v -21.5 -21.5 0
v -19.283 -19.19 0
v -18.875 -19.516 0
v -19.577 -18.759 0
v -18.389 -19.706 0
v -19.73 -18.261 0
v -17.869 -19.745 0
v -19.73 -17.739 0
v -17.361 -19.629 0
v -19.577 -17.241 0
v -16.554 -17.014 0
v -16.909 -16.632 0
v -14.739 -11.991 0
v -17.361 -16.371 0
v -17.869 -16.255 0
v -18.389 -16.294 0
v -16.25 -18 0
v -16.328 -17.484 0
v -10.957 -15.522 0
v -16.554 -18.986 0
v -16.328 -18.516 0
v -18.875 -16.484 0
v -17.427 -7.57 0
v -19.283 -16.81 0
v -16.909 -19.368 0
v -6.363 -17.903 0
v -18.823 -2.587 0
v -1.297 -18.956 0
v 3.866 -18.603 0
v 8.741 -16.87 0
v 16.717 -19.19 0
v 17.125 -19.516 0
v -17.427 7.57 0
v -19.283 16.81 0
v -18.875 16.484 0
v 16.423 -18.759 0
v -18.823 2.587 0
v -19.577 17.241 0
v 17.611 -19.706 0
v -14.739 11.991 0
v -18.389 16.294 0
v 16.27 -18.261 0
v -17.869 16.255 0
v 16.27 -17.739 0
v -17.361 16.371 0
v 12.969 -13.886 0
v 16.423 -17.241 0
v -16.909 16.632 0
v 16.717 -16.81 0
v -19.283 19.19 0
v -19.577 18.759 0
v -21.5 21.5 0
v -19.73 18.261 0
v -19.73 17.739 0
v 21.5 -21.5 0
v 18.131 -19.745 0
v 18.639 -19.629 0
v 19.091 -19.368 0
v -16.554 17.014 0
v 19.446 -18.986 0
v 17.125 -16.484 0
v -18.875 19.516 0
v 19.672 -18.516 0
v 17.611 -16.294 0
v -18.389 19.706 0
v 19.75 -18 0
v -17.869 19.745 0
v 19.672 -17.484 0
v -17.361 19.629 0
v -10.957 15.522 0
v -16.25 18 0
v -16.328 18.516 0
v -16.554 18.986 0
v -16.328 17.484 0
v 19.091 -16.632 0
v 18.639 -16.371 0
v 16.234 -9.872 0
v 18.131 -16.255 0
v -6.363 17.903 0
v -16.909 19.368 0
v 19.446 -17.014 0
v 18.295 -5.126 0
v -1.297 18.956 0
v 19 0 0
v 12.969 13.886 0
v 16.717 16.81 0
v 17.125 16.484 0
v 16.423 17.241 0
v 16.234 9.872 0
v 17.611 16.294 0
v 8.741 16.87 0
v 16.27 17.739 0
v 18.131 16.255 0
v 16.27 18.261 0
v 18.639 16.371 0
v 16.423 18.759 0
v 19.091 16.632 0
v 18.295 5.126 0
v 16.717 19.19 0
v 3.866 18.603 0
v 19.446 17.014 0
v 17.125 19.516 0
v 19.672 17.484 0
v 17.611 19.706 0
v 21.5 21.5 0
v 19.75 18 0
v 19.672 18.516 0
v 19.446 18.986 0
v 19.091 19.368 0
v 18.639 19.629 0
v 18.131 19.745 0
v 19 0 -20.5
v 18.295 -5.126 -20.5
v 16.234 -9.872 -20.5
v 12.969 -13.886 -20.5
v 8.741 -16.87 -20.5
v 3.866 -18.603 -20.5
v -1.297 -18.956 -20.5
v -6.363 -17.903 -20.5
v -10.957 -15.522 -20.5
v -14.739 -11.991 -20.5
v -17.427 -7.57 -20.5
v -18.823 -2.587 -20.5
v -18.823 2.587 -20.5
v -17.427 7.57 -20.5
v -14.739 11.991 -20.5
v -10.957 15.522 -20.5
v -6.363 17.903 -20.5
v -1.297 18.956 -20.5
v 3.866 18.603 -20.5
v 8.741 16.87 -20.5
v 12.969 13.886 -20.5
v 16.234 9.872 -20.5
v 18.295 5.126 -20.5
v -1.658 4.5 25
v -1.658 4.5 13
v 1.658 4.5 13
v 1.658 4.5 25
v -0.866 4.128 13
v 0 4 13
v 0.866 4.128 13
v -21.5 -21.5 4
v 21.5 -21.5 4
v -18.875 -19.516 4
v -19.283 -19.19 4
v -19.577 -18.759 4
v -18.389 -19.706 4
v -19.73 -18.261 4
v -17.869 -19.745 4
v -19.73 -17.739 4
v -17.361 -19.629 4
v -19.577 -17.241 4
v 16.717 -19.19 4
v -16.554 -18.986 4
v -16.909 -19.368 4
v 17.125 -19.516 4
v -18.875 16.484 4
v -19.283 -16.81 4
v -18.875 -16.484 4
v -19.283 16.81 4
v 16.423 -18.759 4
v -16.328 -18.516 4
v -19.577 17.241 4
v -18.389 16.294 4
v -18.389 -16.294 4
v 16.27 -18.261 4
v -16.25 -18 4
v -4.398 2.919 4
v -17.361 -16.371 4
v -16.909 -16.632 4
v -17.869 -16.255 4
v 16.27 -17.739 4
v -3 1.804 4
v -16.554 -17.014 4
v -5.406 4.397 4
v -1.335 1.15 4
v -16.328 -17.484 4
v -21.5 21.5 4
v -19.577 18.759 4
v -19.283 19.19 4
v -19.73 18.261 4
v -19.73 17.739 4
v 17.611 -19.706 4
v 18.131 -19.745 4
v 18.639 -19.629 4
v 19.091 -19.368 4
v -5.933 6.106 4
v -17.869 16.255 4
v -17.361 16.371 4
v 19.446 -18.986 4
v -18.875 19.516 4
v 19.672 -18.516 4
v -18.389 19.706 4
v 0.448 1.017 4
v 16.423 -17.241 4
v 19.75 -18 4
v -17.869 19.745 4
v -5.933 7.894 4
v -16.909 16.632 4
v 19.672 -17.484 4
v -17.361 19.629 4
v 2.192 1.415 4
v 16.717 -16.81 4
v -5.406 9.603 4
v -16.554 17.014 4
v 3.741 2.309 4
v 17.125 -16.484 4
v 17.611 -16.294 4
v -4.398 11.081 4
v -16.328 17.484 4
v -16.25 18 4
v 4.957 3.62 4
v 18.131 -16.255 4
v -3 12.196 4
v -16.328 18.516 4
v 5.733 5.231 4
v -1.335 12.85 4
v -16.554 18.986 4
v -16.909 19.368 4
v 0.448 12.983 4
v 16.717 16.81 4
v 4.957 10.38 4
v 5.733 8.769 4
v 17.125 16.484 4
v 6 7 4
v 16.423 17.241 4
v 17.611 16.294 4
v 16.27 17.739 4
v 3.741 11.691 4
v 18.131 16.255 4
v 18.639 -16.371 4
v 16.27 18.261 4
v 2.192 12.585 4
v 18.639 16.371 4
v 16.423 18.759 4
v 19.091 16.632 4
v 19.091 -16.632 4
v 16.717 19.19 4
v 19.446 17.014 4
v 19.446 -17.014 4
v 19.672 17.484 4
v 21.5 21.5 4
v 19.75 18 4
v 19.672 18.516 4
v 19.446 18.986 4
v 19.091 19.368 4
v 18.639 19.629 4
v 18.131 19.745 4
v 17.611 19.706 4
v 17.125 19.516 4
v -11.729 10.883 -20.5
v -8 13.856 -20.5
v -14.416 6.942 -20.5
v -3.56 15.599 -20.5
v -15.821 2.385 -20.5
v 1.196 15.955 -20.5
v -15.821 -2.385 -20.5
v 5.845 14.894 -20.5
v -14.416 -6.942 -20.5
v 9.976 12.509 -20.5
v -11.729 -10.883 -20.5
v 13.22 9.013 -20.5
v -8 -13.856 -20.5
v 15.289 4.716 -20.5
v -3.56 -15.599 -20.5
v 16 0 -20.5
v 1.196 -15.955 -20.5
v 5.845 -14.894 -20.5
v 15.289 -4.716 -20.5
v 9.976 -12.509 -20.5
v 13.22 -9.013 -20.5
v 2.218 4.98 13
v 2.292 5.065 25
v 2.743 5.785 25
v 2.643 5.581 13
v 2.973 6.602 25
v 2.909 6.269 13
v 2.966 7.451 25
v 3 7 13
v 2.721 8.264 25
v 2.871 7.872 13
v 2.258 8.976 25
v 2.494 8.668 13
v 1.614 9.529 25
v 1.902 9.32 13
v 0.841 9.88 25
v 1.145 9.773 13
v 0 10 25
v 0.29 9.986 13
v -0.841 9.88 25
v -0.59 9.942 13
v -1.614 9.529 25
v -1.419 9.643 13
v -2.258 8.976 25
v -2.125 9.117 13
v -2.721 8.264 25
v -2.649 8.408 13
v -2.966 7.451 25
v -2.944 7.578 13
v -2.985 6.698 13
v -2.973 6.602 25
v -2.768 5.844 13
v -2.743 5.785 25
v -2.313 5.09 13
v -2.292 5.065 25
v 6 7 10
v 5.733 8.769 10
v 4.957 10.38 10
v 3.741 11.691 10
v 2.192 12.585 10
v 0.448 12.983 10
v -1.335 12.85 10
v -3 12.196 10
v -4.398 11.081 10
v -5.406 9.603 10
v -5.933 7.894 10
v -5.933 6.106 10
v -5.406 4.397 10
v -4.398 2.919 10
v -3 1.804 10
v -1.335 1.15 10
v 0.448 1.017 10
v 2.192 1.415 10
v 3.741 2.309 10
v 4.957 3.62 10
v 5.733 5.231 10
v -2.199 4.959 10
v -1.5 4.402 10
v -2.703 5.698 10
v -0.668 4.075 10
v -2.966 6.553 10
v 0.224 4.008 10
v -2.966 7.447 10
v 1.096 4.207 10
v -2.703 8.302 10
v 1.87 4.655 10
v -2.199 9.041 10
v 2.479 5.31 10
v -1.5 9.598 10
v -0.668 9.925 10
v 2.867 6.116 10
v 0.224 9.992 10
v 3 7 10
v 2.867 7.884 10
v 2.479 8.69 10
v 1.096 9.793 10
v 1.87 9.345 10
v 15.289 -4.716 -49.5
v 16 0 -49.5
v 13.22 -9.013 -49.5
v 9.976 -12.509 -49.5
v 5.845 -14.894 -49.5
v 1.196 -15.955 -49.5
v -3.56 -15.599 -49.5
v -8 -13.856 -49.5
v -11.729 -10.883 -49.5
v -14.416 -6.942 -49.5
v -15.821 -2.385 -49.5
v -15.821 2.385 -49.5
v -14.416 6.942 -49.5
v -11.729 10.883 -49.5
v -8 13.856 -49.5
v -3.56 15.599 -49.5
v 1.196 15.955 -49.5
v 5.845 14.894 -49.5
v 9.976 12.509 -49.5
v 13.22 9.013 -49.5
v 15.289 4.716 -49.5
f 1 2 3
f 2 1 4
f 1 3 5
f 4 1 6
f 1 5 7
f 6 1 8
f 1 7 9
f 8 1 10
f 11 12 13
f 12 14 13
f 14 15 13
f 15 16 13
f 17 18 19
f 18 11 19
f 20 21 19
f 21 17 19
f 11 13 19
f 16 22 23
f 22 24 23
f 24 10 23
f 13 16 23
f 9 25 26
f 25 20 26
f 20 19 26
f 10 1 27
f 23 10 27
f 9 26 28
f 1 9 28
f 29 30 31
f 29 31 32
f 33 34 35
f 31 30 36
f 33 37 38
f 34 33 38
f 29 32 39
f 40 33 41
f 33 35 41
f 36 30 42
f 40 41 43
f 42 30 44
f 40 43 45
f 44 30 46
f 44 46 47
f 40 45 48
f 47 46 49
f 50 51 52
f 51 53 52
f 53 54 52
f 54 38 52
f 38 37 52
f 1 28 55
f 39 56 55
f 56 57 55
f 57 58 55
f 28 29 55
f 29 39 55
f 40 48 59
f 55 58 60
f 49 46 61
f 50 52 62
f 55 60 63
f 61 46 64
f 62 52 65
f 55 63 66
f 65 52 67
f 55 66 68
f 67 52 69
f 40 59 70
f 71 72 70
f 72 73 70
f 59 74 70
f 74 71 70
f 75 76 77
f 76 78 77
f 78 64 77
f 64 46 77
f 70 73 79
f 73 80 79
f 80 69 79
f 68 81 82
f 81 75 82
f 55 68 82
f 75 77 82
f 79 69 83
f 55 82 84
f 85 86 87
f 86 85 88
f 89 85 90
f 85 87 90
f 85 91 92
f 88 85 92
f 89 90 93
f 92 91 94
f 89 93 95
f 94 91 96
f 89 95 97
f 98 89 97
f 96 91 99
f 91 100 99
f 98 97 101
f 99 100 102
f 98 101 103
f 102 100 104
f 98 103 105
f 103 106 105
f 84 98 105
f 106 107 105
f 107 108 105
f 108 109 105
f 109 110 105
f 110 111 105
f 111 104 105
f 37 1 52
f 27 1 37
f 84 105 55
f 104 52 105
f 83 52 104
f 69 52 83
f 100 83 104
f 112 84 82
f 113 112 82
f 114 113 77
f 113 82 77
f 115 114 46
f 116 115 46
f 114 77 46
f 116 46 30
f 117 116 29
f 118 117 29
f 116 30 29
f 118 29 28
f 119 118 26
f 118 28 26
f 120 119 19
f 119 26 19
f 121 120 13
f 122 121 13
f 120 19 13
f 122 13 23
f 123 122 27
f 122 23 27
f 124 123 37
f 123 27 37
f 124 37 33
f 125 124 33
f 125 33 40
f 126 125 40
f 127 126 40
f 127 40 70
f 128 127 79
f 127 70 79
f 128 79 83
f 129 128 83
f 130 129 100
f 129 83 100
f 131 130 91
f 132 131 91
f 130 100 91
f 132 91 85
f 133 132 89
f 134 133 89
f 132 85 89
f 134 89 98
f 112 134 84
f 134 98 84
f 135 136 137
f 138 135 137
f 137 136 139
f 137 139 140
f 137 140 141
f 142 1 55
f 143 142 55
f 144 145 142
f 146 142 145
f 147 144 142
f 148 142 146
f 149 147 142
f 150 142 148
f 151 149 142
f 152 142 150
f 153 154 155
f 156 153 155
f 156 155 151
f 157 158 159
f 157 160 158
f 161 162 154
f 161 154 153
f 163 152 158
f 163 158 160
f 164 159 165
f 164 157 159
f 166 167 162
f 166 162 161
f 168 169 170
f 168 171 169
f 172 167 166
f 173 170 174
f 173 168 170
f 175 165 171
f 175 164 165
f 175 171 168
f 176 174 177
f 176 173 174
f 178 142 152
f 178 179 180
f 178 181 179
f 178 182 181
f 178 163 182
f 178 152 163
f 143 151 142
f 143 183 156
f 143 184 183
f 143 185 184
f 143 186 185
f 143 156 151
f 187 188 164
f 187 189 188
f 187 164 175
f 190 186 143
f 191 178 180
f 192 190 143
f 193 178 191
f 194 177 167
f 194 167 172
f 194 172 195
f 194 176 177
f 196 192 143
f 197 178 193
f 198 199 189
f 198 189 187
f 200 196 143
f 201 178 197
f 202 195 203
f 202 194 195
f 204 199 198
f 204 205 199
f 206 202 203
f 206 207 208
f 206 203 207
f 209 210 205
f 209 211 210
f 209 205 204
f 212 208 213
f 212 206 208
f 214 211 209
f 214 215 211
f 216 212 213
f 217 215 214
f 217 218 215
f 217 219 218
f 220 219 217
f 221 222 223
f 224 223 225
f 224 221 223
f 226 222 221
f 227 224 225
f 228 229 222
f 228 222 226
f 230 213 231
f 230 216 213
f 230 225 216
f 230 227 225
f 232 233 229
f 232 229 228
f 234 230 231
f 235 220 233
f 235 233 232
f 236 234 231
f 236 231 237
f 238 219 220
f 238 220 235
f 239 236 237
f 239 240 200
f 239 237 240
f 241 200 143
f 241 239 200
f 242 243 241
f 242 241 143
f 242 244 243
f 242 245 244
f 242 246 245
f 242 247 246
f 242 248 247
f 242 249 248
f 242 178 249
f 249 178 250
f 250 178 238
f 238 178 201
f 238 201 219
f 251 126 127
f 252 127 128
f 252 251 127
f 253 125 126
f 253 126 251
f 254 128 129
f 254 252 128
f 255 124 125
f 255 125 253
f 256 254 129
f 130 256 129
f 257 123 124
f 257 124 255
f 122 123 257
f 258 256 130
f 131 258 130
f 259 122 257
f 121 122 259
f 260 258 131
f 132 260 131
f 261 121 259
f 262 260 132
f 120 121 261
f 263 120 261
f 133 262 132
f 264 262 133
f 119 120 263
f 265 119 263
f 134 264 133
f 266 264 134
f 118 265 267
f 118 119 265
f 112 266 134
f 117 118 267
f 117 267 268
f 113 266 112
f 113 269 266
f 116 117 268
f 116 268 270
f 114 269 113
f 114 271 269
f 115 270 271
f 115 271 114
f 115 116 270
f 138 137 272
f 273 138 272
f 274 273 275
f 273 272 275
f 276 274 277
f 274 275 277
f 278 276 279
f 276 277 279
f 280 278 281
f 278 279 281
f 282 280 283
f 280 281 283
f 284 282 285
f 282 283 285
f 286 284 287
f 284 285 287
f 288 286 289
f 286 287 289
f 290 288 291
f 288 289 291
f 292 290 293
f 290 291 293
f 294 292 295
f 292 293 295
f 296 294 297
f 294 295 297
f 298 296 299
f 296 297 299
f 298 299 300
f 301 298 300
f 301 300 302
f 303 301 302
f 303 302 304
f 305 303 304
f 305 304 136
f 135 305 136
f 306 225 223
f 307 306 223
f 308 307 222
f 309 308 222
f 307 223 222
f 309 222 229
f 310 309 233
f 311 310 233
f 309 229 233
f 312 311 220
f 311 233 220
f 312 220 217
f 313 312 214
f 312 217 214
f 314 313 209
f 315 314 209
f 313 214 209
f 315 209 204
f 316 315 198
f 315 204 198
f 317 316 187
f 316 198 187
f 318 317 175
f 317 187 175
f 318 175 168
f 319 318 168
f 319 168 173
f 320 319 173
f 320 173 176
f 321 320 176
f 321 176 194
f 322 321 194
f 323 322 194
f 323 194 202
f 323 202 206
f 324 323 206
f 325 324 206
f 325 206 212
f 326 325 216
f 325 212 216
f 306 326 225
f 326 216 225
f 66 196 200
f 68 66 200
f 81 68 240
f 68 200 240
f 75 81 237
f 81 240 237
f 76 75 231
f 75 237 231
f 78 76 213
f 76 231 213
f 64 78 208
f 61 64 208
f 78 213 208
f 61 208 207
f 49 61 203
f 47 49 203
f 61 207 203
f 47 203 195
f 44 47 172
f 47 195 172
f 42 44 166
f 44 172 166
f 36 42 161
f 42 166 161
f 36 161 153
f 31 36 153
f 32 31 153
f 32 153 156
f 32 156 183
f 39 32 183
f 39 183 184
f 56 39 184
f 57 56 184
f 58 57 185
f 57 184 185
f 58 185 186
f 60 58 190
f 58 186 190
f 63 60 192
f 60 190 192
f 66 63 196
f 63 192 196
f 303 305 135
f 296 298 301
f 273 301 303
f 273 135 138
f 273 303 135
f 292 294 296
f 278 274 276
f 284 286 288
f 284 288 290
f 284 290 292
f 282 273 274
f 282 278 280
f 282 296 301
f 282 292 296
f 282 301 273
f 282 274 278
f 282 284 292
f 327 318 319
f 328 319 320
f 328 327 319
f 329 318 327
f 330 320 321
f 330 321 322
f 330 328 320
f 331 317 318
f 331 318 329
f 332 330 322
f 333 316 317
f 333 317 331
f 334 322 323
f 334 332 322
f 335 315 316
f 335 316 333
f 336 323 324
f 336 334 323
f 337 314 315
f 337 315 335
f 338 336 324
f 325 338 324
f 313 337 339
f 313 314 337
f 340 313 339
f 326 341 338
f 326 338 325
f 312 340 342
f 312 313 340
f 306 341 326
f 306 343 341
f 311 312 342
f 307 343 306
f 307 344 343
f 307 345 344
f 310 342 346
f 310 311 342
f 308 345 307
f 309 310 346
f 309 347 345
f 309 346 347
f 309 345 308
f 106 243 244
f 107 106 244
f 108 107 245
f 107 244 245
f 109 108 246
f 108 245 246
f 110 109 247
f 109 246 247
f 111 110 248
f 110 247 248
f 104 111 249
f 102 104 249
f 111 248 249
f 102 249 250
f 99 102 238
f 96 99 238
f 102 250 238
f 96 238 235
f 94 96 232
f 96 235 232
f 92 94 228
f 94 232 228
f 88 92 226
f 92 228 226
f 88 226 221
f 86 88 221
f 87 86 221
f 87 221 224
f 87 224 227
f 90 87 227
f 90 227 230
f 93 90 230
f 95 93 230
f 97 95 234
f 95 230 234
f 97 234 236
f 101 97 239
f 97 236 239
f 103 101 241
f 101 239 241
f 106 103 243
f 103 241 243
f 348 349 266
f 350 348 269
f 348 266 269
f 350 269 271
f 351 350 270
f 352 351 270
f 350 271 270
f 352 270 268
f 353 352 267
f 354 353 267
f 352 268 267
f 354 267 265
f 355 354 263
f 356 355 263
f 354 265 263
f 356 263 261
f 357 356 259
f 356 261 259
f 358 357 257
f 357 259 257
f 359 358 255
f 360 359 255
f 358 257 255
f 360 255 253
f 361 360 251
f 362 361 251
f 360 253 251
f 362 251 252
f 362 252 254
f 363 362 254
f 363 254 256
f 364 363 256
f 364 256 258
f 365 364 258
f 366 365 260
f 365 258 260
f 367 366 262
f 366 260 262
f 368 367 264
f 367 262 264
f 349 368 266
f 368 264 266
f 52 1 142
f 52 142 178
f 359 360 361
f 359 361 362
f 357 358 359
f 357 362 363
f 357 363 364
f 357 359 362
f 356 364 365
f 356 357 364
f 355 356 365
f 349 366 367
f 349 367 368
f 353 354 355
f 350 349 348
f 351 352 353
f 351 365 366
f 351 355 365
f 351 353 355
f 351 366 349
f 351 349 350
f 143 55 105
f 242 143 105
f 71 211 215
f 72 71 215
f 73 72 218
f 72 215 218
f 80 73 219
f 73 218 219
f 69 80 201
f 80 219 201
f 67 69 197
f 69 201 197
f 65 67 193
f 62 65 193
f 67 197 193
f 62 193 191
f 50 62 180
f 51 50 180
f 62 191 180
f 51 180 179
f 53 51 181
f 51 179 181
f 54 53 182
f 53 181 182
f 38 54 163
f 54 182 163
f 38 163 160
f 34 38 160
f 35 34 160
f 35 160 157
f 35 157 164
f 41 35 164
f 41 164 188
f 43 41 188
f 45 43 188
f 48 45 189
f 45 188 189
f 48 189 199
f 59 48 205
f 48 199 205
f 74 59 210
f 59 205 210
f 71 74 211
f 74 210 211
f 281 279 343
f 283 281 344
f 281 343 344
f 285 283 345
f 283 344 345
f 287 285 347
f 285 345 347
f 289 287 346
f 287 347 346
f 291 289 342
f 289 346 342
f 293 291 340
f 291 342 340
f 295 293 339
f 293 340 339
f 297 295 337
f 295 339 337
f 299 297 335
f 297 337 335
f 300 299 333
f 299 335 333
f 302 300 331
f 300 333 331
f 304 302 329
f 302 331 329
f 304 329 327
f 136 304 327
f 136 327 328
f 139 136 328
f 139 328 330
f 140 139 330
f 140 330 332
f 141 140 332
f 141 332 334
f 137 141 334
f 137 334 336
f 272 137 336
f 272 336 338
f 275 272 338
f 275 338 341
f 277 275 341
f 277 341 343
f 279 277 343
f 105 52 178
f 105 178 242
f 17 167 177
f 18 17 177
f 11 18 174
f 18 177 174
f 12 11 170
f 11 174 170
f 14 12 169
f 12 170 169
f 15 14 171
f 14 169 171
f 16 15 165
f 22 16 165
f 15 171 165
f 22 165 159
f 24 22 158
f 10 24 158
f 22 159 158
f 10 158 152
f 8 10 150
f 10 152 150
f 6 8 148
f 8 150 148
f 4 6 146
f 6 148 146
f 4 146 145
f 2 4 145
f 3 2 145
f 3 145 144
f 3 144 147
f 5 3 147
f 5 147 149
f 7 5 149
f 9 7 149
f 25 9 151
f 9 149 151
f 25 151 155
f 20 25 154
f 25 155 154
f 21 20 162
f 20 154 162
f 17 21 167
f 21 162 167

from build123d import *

# Parameters (mm, degrees)
SKETCH_W     = 43
SKETCH_H     = 43
PAD_DEPTH    = 4
SKETCH001_R  = 1.75
POCKET_DEPTH = 4
SKETCH002_R  = 6
PAD001_DEPTH = 6
SKETCH003_R  = 3
PAD002_DEPTH = 3
PAD003_DEPTH = 12
SKETCH005_R  = 19
PAD004_DEPTH = 20.5
SKETCH006_R  = 16
PAD005_DEPTH = 29


with BuildPart() as part:
    # Sketch → Pad (new body)
    with BuildSketch(Plane.XY):
        Rectangle(SKETCH_W, SKETCH_H)
    extrude(amount=PAD_DEPTH)

    # Sketch001 (on Face6 of Pad) → Pocket (cut)
    with BuildSketch(Plane.XY.offset(4)):
        with Locations((-18, 18)):
            Circle(SKETCH001_R)
        with Locations((18, 18)):
            Circle(SKETCH001_R)
        with Locations((18, -18)):
            Circle(SKETCH001_R)
        with Locations((-18, -18)):
            Circle(SKETCH001_R)
    extrude(amount=-POCKET_DEPTH, mode=Mode.SUBTRACT)

    # Sketch002 (on Face5 of Pocket) → Pad001 (join)
    with BuildSketch(Plane.XY.offset(4)):
        with Locations((0, 7)):
            Circle(SKETCH002_R)
    extrude(amount=PAD001_DEPTH)

    # Sketch003 (on Face12 of Pad001) → Pad002 (join)
    with BuildSketch(Plane.XY.offset(10)):
        with Locations((0, 7)):
            Circle(SKETCH003_R)
    extrude(amount=PAD002_DEPTH)

    # Sketch004 (on Face14 of Pad002) → Pad003 (join)
    with BuildSketch(Plane.XY.offset(13)):
        with BuildLine():
            ThreePointArc((1.658312, 4.5), (0, 10), (-1.658312, 4.5))
            Line((-1.658312, 4.5), (1.658312, 4.5))
        make_face()
    extrude(amount=PAD003_DEPTH)

    # Sketch005 (on Face4 of Pad003) → Pad004 (join)
    with BuildSketch(Plane(origin=(0, 0, 0), x_dir=(1, 0, 0), z_dir=(0, 0, -1))):
        Circle(SKETCH005_R)
    extrude(amount=PAD004_DEPTH)

    # Sketch006 (on Face13 of Pad004) → Pad005 (join)
    with BuildSketch(Plane(origin=(0, 0, -20.5), x_dir=(1, 0, 0), z_dir=(0, 0, -1))):
        Circle(SKETCH006_R)
    extrude(amount=PAD005_DEPTH)


solid = part.part
